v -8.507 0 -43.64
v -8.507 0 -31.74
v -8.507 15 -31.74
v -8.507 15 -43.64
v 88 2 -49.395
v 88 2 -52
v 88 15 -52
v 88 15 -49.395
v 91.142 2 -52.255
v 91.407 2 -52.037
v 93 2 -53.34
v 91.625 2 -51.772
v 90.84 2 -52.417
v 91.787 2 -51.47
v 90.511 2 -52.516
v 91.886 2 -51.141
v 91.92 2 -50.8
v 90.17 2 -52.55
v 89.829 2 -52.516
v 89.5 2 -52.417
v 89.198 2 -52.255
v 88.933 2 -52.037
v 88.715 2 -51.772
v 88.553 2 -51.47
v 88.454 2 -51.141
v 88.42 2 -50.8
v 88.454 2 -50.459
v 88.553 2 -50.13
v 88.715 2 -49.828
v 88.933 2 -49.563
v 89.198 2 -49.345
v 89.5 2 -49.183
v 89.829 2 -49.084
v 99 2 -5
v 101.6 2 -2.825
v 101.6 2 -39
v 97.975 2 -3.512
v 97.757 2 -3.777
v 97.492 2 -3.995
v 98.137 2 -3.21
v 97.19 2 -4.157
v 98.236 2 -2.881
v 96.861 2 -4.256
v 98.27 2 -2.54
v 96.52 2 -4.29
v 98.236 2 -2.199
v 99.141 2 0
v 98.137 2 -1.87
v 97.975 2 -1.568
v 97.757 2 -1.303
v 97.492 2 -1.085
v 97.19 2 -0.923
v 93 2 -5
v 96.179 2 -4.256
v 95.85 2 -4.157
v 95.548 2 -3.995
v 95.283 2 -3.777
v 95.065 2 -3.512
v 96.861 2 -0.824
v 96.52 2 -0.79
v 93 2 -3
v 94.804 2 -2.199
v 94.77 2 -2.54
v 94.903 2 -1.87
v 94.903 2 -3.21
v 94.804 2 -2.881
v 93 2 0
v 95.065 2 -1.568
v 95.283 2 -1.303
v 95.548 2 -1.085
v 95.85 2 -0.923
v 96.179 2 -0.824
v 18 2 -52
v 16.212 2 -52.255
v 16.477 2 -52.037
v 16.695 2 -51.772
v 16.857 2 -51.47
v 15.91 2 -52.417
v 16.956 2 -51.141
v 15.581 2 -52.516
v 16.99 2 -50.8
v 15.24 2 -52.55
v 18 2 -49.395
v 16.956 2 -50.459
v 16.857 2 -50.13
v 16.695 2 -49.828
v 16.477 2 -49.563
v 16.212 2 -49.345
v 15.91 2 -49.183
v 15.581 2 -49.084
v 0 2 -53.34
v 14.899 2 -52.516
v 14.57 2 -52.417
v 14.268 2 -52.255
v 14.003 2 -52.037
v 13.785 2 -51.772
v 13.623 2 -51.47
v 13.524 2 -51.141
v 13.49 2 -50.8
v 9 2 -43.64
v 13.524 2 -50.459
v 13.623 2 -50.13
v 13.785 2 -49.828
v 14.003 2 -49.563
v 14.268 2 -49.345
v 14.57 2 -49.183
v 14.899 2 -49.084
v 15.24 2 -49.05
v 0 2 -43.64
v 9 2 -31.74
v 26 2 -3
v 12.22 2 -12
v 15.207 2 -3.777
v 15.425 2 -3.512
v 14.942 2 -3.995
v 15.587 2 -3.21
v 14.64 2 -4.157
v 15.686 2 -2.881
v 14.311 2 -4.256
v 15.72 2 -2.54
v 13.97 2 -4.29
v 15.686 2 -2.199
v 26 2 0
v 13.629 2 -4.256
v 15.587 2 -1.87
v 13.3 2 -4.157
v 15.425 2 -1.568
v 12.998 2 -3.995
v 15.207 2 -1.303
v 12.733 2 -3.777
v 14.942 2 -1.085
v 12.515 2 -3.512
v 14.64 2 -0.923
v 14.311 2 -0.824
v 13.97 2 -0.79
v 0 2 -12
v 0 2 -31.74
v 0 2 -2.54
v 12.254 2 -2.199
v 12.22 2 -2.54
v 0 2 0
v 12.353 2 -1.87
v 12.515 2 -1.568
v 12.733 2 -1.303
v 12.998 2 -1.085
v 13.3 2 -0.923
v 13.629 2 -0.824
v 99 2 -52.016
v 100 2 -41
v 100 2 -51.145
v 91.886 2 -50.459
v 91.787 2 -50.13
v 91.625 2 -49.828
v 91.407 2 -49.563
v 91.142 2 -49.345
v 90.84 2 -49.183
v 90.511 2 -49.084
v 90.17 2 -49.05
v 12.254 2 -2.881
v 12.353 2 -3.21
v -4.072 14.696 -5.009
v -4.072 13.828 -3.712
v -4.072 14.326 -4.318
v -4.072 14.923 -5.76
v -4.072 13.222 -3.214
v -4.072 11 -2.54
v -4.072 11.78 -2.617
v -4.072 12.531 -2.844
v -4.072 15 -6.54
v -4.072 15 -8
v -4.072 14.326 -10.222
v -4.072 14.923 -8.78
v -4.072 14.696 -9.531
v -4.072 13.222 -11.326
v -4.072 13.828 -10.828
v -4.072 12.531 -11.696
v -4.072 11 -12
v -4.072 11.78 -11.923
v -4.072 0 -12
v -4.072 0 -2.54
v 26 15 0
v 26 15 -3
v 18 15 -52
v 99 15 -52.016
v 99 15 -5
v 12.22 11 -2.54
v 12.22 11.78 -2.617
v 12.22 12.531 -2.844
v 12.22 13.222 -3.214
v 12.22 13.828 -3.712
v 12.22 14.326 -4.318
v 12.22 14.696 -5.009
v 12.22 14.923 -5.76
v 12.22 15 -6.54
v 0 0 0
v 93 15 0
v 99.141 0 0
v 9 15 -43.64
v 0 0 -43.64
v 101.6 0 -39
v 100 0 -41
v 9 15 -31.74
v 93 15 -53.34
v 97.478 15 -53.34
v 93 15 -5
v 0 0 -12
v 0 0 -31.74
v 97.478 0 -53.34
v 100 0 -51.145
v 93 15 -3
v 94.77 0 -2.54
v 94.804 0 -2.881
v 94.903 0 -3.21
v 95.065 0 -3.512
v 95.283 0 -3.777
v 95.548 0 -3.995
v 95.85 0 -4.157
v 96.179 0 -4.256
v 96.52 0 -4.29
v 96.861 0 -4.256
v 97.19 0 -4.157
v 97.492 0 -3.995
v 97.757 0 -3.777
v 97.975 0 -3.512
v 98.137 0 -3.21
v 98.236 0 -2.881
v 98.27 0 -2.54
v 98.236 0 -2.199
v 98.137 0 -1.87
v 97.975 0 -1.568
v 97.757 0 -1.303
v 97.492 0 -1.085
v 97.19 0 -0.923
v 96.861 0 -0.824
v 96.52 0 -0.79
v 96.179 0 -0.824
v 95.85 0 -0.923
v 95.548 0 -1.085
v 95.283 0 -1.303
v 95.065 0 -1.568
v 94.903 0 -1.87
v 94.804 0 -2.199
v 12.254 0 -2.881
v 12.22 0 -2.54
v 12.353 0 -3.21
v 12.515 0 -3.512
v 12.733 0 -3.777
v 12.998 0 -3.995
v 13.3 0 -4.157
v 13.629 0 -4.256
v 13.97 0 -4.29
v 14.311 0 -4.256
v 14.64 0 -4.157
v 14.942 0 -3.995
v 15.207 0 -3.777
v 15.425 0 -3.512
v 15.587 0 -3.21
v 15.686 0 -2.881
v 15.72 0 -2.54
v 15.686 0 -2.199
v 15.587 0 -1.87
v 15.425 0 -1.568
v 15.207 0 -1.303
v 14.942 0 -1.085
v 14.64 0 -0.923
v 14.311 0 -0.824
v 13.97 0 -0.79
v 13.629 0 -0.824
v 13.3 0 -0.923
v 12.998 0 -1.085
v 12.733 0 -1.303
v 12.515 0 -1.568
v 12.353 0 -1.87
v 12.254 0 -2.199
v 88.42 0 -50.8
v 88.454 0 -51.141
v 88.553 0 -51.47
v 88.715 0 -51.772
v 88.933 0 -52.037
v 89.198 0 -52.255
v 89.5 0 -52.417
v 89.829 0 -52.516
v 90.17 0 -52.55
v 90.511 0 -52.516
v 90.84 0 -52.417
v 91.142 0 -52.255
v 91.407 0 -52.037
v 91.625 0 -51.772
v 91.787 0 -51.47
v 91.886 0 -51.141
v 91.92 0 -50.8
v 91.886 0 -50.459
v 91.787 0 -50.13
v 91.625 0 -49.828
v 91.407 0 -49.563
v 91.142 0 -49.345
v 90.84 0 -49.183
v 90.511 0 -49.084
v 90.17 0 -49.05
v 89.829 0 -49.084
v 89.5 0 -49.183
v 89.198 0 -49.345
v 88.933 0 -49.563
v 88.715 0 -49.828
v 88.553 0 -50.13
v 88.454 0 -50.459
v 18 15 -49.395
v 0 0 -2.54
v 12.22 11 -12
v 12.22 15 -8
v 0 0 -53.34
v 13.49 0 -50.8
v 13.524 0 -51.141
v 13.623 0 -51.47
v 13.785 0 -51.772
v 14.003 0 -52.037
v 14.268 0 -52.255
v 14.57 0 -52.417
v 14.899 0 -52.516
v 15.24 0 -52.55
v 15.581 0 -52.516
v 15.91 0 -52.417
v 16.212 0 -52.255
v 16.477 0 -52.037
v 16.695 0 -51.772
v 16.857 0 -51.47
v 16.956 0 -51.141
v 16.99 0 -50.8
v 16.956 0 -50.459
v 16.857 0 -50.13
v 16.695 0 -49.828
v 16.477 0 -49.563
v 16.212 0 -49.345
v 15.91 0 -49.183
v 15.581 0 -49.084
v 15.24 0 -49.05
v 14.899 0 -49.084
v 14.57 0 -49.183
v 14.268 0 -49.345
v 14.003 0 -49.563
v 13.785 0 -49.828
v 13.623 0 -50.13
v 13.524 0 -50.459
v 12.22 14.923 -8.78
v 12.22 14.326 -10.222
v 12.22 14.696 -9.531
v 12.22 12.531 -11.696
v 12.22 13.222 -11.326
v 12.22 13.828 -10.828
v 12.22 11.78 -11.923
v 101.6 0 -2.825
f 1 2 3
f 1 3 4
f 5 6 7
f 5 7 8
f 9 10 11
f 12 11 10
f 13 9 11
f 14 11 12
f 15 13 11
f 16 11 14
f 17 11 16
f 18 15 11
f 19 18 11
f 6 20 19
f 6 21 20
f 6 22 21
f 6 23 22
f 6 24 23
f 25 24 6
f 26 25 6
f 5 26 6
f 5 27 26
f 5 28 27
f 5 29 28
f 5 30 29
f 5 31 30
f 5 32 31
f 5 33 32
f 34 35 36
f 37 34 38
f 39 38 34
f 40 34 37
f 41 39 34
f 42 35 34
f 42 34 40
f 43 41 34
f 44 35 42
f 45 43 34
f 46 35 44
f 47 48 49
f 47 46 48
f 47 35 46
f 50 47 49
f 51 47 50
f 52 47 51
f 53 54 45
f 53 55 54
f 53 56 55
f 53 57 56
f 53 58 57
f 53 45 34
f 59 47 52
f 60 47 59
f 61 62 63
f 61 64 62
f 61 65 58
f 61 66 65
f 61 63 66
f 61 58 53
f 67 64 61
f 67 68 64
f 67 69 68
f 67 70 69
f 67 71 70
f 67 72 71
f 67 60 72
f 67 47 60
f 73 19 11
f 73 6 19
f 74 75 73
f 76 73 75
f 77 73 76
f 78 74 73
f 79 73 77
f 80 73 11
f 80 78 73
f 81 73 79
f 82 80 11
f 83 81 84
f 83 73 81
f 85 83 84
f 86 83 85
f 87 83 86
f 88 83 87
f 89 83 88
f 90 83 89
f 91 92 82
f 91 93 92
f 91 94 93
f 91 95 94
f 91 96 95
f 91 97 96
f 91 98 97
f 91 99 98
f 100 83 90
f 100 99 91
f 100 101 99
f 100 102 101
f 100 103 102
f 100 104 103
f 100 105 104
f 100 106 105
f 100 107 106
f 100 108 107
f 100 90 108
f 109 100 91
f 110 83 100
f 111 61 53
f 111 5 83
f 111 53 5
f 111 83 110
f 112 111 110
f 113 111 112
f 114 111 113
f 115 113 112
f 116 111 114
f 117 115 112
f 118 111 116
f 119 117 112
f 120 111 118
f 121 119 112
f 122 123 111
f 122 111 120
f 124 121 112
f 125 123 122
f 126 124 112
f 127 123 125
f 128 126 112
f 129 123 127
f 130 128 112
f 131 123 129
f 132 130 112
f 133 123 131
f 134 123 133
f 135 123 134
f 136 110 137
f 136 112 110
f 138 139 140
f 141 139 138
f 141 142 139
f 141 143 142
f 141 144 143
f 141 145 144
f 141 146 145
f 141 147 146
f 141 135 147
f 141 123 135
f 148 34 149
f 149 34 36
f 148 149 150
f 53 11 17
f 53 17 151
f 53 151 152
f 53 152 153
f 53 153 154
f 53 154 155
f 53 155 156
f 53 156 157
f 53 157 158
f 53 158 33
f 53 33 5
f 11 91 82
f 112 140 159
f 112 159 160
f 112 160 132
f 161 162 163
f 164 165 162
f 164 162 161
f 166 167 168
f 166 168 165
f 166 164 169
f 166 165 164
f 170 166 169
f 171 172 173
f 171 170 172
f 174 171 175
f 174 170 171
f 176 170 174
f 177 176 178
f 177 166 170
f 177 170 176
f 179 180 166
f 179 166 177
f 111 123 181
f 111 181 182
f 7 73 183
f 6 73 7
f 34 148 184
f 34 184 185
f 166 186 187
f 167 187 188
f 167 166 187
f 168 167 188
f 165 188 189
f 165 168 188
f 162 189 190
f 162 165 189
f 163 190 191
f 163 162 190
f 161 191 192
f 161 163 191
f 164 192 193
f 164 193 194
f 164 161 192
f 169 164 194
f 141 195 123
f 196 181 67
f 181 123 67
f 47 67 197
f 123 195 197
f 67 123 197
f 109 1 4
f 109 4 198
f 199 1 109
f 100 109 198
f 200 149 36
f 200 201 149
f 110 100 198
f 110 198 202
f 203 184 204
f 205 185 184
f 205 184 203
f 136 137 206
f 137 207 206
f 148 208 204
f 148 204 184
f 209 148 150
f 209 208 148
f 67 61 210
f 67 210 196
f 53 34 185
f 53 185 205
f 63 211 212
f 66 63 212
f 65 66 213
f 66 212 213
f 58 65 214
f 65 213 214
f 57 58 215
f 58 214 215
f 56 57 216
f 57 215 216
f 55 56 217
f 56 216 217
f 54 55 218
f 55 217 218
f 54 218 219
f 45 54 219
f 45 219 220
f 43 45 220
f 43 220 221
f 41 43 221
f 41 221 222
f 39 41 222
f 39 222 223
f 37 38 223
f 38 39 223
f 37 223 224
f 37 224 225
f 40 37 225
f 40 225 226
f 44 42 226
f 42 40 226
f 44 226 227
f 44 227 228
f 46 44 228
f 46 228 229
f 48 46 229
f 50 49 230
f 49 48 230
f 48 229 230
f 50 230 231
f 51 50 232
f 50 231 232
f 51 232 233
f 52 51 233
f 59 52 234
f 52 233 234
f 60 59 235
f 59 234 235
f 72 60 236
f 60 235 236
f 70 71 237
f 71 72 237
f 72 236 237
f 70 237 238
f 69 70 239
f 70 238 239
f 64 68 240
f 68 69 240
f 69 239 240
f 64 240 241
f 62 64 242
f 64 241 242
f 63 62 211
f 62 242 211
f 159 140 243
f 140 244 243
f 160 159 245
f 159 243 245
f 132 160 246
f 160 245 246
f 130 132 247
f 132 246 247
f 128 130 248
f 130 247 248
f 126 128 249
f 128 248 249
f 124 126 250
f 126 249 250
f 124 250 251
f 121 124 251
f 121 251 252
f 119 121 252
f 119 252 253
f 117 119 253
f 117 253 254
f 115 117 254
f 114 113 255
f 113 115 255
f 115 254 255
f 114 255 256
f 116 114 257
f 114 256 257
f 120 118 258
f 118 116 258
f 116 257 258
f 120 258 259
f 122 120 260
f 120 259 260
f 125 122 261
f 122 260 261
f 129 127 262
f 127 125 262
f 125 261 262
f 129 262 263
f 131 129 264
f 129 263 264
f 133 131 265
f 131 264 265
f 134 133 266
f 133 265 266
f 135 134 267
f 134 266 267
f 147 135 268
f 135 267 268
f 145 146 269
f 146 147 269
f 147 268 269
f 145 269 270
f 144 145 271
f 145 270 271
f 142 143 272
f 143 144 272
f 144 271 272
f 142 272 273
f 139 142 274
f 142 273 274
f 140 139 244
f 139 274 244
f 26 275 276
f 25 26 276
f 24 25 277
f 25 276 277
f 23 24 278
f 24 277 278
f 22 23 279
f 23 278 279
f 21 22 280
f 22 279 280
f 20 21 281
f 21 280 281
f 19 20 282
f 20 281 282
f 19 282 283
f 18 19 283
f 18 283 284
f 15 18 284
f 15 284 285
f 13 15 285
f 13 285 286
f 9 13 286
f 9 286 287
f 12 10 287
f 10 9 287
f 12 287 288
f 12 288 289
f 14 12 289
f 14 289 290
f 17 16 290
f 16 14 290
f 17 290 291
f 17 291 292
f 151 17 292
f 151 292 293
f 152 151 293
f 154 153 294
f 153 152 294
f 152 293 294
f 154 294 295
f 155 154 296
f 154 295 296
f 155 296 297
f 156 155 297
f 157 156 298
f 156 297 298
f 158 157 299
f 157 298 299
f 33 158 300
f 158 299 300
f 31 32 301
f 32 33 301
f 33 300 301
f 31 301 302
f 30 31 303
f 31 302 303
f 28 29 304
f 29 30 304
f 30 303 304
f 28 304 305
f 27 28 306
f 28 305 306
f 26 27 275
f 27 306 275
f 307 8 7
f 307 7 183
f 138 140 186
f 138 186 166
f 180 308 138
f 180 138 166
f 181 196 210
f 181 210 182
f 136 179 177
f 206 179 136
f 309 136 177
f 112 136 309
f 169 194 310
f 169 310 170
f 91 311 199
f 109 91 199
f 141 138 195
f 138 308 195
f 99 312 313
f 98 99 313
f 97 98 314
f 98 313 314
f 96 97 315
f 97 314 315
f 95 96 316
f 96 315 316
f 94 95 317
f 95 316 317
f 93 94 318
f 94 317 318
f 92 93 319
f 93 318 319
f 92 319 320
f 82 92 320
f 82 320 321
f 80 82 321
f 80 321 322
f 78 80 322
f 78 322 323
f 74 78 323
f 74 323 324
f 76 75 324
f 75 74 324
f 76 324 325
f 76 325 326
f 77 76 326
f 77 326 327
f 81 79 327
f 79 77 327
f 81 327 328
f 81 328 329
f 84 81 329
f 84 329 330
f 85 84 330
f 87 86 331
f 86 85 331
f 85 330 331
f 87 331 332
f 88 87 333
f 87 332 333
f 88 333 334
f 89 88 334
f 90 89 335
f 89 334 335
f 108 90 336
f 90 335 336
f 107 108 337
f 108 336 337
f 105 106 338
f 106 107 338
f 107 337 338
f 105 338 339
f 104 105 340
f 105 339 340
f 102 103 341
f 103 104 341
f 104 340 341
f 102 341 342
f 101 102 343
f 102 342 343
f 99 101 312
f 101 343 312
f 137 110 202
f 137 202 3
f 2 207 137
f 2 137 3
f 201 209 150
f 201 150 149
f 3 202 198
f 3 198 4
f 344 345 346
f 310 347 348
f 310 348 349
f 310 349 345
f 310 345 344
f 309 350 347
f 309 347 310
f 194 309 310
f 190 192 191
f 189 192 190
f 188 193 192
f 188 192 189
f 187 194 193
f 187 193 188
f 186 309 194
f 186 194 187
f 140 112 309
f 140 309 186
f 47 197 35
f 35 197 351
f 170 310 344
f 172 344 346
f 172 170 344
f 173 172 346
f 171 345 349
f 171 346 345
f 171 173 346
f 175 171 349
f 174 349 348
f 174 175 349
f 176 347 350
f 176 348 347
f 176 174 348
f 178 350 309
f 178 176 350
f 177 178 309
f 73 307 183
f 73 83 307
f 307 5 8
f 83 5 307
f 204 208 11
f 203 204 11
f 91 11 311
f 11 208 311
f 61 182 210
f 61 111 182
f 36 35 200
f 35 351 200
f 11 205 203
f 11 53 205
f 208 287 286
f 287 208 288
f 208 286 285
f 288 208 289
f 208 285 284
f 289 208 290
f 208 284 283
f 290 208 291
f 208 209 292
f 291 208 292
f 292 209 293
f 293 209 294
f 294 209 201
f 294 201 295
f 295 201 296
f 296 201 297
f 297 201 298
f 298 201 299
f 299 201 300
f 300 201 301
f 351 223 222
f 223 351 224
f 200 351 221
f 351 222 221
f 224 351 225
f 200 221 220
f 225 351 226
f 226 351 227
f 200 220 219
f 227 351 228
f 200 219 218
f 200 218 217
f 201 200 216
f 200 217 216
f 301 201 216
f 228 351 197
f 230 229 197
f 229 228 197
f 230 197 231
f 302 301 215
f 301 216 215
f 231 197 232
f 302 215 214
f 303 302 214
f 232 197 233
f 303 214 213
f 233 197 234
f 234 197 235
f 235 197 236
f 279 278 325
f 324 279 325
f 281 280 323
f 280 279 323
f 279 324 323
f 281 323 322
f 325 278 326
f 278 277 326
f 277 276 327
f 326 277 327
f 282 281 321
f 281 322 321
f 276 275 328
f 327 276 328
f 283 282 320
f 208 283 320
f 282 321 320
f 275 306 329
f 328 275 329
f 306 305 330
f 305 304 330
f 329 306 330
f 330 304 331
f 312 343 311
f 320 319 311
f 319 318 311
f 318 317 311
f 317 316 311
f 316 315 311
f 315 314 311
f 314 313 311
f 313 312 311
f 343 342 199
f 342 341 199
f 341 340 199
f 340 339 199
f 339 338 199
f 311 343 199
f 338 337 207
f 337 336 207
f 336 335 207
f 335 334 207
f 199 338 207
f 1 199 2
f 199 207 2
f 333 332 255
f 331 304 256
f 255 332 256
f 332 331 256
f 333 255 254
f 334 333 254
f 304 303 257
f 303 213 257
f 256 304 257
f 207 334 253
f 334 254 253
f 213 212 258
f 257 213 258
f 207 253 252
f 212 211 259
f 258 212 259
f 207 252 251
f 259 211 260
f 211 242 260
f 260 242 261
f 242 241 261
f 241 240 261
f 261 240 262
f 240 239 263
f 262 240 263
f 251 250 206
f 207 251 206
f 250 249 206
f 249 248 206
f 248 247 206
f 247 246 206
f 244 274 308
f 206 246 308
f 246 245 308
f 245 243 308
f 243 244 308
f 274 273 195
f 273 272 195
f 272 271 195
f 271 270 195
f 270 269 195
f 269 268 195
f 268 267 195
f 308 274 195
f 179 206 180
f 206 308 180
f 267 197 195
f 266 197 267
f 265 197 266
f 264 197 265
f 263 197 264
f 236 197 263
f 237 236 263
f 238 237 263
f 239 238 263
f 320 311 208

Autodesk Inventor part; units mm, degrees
ref_plane "YZ Plane" through (0, 0, 0) normal (1, 0, 0) x (0, 1, 0)
ref_plane "XZ Plane" through (0, 0, 0) normal (0, 1, 0) x (-1, 0, 0)
ref_plane "XY Plane" through (0, 0, 0) normal (0, 0, 1) x (1, 0, 0)
sketch "Sketch1" plane through (0, 0, 0) normal (0, 1, 0) x (-1, 0, 0)
  line L0 (8.5074, -53.6851) -> (-102.7512, -53.6851) construction
  line L1 (-102.7512, -53.6851) -> (-102.7512, 0.3149) construction
  line L2 (-102.7512, 0.3149) -> (8.5074, 0.3149) construction
  line L3 (8.5074, 0.3149) -> (8.5074, -53.6851) construction
  line L4 (0, 0) -> (-101.6, 0)
  line L5 (-101.6, 0) -> (-101.6, -53.34)
  line L6 (-101.6, -53.34) -> (0, -53.34)
  line L7 (0, -53.34) -> (0, 0)
  circle A0 centre (-15.24, -50.8) radius 1.75
  circle A1 centre (-13.97, -2.54) radius 1.75
  circle A2 centre (-90.17, -50.8) radius 1.75
  circle A3 centre (-96.52, -2.54) radius 1.75
  line L8 (8.5074, -43.64) -> (-9, -43.64)
  line L9 (-9, -43.64) -> (-9, -31.74)
  line L10 (-9, -31.74) -> (8.5074, -31.74)
  line L11 (8.5074, -31.74) -> (8.5074, -43.64)
  line L12 (4.072, -12) -> (-12.22, -12)
  line L13 (-12.22, -12) -> (-12.22, -2.54)
  line L14 (-12.22, -2.54) -> (4.072, -2.54)
  line L15 (4.072, -2.54) -> (4.072, -12)
  line L16 (-26, -3) -> (-93, -3)
  line L17 (-93, -3) -> (-93, 0)
  line L18 (-93, 0) -> (-26, 0)
  line L19 (-26, 0) -> (-26, -3)
  line L20 (-93, -53.34) -> (-99, -53.34)
  line L21 (-99, -53.34) -> (-99, -5)
  line L22 (-99, -5) -> (-93, -5)
  line L23 (-93, -5) -> (-93, -53.34)
  line L24 (-18, -52) -> (-88, -52)
  line L25 (-88, -52) -> (-88, -49.3951)
  line L26 (-88, -49.3951) -> (-18, -49.3951)
  line L27 (-18, -49.3951) -> (-18, -52)
  line L28 (-97.4785, -53.34) -> (-100, -51.1451)
  line L29 (-100, -51.1451) -> (-100, -41)
  line L30 (-100, -41) -> (-101.6, -39)
  line L31 (-99.1411, 0) -> (-101.6, -2.8248)
  point P0 (-99, -52.0156)
  point P1 (-26, 0)
  dimension "d37" = 3.5
  dimension "d3" = 101.6
  dimension "d6" = 53.34
  dimension "d27" = 54
  dimension "d32" = 3.5
  dimension "d35" = 15.24
  dimension "d38" = 2.54
  dimension "d40" = 13.97
  dimension "d41" = 3.5
  dimension "d42" = 3.5
  dimension "d43" = 90.17
  dimension "d45" = 2.54
  dimension "d46" = 2.54
  dimension "d48" = 96.52
  dimension "d69" = 8.5074
  dimension "d70" = 9.7
  dimension "d71" = 11.9
  dimension "d73" = 2.54
extrude "Extrusion1" add sketch "Sketch1" along normal blind 2 contours L7 L14 L13 L12 L10 L9 L8 L6 L23 L22 L21 L28 L29 L30 L5 L31 L4 L17 L16 L19 | L19 L16 L17 L4 | L7 L12 L13 L14 | L7 L8 L9 L10 | L6 L28 L21 L22 L23 | L24 L25 L26 L27
sketch "Sketch2" plane through (0, 2, 0) normal (0, 1, 0) x (1, 0, 0)
  line L0 (-8.4913, 53.8189) -> (102.7673, 53.8189) construction
  line L1 (102.7673, 53.8189) -> (102.7673, -0.1811) construction
  line L2 (102.7673, -0.1811) -> (-8.4913, -0.1811) construction
  line L3 (-8.4913, -0.1811) -> (-8.4913, 53.8189) construction
  point P0 (0, 0)
  dimension "d60" = 54
extrude "Extrusion2" add sketch "Sketch1" along normal blind 15 contours L19 L16 L17 L4 | L14 L15 L12 L7 | L7 L12 L13 L14 | L10 L11 L8 L7 | L7 L8 L9 L10 | L6 L28 L21 L22 L23 | L24 L25 L26 L27
fillet "Fillet1" radius 4 2 edges at (4.074, 15, -2.54) (4.074, 15, -12)
properties part number "arduinomega"
